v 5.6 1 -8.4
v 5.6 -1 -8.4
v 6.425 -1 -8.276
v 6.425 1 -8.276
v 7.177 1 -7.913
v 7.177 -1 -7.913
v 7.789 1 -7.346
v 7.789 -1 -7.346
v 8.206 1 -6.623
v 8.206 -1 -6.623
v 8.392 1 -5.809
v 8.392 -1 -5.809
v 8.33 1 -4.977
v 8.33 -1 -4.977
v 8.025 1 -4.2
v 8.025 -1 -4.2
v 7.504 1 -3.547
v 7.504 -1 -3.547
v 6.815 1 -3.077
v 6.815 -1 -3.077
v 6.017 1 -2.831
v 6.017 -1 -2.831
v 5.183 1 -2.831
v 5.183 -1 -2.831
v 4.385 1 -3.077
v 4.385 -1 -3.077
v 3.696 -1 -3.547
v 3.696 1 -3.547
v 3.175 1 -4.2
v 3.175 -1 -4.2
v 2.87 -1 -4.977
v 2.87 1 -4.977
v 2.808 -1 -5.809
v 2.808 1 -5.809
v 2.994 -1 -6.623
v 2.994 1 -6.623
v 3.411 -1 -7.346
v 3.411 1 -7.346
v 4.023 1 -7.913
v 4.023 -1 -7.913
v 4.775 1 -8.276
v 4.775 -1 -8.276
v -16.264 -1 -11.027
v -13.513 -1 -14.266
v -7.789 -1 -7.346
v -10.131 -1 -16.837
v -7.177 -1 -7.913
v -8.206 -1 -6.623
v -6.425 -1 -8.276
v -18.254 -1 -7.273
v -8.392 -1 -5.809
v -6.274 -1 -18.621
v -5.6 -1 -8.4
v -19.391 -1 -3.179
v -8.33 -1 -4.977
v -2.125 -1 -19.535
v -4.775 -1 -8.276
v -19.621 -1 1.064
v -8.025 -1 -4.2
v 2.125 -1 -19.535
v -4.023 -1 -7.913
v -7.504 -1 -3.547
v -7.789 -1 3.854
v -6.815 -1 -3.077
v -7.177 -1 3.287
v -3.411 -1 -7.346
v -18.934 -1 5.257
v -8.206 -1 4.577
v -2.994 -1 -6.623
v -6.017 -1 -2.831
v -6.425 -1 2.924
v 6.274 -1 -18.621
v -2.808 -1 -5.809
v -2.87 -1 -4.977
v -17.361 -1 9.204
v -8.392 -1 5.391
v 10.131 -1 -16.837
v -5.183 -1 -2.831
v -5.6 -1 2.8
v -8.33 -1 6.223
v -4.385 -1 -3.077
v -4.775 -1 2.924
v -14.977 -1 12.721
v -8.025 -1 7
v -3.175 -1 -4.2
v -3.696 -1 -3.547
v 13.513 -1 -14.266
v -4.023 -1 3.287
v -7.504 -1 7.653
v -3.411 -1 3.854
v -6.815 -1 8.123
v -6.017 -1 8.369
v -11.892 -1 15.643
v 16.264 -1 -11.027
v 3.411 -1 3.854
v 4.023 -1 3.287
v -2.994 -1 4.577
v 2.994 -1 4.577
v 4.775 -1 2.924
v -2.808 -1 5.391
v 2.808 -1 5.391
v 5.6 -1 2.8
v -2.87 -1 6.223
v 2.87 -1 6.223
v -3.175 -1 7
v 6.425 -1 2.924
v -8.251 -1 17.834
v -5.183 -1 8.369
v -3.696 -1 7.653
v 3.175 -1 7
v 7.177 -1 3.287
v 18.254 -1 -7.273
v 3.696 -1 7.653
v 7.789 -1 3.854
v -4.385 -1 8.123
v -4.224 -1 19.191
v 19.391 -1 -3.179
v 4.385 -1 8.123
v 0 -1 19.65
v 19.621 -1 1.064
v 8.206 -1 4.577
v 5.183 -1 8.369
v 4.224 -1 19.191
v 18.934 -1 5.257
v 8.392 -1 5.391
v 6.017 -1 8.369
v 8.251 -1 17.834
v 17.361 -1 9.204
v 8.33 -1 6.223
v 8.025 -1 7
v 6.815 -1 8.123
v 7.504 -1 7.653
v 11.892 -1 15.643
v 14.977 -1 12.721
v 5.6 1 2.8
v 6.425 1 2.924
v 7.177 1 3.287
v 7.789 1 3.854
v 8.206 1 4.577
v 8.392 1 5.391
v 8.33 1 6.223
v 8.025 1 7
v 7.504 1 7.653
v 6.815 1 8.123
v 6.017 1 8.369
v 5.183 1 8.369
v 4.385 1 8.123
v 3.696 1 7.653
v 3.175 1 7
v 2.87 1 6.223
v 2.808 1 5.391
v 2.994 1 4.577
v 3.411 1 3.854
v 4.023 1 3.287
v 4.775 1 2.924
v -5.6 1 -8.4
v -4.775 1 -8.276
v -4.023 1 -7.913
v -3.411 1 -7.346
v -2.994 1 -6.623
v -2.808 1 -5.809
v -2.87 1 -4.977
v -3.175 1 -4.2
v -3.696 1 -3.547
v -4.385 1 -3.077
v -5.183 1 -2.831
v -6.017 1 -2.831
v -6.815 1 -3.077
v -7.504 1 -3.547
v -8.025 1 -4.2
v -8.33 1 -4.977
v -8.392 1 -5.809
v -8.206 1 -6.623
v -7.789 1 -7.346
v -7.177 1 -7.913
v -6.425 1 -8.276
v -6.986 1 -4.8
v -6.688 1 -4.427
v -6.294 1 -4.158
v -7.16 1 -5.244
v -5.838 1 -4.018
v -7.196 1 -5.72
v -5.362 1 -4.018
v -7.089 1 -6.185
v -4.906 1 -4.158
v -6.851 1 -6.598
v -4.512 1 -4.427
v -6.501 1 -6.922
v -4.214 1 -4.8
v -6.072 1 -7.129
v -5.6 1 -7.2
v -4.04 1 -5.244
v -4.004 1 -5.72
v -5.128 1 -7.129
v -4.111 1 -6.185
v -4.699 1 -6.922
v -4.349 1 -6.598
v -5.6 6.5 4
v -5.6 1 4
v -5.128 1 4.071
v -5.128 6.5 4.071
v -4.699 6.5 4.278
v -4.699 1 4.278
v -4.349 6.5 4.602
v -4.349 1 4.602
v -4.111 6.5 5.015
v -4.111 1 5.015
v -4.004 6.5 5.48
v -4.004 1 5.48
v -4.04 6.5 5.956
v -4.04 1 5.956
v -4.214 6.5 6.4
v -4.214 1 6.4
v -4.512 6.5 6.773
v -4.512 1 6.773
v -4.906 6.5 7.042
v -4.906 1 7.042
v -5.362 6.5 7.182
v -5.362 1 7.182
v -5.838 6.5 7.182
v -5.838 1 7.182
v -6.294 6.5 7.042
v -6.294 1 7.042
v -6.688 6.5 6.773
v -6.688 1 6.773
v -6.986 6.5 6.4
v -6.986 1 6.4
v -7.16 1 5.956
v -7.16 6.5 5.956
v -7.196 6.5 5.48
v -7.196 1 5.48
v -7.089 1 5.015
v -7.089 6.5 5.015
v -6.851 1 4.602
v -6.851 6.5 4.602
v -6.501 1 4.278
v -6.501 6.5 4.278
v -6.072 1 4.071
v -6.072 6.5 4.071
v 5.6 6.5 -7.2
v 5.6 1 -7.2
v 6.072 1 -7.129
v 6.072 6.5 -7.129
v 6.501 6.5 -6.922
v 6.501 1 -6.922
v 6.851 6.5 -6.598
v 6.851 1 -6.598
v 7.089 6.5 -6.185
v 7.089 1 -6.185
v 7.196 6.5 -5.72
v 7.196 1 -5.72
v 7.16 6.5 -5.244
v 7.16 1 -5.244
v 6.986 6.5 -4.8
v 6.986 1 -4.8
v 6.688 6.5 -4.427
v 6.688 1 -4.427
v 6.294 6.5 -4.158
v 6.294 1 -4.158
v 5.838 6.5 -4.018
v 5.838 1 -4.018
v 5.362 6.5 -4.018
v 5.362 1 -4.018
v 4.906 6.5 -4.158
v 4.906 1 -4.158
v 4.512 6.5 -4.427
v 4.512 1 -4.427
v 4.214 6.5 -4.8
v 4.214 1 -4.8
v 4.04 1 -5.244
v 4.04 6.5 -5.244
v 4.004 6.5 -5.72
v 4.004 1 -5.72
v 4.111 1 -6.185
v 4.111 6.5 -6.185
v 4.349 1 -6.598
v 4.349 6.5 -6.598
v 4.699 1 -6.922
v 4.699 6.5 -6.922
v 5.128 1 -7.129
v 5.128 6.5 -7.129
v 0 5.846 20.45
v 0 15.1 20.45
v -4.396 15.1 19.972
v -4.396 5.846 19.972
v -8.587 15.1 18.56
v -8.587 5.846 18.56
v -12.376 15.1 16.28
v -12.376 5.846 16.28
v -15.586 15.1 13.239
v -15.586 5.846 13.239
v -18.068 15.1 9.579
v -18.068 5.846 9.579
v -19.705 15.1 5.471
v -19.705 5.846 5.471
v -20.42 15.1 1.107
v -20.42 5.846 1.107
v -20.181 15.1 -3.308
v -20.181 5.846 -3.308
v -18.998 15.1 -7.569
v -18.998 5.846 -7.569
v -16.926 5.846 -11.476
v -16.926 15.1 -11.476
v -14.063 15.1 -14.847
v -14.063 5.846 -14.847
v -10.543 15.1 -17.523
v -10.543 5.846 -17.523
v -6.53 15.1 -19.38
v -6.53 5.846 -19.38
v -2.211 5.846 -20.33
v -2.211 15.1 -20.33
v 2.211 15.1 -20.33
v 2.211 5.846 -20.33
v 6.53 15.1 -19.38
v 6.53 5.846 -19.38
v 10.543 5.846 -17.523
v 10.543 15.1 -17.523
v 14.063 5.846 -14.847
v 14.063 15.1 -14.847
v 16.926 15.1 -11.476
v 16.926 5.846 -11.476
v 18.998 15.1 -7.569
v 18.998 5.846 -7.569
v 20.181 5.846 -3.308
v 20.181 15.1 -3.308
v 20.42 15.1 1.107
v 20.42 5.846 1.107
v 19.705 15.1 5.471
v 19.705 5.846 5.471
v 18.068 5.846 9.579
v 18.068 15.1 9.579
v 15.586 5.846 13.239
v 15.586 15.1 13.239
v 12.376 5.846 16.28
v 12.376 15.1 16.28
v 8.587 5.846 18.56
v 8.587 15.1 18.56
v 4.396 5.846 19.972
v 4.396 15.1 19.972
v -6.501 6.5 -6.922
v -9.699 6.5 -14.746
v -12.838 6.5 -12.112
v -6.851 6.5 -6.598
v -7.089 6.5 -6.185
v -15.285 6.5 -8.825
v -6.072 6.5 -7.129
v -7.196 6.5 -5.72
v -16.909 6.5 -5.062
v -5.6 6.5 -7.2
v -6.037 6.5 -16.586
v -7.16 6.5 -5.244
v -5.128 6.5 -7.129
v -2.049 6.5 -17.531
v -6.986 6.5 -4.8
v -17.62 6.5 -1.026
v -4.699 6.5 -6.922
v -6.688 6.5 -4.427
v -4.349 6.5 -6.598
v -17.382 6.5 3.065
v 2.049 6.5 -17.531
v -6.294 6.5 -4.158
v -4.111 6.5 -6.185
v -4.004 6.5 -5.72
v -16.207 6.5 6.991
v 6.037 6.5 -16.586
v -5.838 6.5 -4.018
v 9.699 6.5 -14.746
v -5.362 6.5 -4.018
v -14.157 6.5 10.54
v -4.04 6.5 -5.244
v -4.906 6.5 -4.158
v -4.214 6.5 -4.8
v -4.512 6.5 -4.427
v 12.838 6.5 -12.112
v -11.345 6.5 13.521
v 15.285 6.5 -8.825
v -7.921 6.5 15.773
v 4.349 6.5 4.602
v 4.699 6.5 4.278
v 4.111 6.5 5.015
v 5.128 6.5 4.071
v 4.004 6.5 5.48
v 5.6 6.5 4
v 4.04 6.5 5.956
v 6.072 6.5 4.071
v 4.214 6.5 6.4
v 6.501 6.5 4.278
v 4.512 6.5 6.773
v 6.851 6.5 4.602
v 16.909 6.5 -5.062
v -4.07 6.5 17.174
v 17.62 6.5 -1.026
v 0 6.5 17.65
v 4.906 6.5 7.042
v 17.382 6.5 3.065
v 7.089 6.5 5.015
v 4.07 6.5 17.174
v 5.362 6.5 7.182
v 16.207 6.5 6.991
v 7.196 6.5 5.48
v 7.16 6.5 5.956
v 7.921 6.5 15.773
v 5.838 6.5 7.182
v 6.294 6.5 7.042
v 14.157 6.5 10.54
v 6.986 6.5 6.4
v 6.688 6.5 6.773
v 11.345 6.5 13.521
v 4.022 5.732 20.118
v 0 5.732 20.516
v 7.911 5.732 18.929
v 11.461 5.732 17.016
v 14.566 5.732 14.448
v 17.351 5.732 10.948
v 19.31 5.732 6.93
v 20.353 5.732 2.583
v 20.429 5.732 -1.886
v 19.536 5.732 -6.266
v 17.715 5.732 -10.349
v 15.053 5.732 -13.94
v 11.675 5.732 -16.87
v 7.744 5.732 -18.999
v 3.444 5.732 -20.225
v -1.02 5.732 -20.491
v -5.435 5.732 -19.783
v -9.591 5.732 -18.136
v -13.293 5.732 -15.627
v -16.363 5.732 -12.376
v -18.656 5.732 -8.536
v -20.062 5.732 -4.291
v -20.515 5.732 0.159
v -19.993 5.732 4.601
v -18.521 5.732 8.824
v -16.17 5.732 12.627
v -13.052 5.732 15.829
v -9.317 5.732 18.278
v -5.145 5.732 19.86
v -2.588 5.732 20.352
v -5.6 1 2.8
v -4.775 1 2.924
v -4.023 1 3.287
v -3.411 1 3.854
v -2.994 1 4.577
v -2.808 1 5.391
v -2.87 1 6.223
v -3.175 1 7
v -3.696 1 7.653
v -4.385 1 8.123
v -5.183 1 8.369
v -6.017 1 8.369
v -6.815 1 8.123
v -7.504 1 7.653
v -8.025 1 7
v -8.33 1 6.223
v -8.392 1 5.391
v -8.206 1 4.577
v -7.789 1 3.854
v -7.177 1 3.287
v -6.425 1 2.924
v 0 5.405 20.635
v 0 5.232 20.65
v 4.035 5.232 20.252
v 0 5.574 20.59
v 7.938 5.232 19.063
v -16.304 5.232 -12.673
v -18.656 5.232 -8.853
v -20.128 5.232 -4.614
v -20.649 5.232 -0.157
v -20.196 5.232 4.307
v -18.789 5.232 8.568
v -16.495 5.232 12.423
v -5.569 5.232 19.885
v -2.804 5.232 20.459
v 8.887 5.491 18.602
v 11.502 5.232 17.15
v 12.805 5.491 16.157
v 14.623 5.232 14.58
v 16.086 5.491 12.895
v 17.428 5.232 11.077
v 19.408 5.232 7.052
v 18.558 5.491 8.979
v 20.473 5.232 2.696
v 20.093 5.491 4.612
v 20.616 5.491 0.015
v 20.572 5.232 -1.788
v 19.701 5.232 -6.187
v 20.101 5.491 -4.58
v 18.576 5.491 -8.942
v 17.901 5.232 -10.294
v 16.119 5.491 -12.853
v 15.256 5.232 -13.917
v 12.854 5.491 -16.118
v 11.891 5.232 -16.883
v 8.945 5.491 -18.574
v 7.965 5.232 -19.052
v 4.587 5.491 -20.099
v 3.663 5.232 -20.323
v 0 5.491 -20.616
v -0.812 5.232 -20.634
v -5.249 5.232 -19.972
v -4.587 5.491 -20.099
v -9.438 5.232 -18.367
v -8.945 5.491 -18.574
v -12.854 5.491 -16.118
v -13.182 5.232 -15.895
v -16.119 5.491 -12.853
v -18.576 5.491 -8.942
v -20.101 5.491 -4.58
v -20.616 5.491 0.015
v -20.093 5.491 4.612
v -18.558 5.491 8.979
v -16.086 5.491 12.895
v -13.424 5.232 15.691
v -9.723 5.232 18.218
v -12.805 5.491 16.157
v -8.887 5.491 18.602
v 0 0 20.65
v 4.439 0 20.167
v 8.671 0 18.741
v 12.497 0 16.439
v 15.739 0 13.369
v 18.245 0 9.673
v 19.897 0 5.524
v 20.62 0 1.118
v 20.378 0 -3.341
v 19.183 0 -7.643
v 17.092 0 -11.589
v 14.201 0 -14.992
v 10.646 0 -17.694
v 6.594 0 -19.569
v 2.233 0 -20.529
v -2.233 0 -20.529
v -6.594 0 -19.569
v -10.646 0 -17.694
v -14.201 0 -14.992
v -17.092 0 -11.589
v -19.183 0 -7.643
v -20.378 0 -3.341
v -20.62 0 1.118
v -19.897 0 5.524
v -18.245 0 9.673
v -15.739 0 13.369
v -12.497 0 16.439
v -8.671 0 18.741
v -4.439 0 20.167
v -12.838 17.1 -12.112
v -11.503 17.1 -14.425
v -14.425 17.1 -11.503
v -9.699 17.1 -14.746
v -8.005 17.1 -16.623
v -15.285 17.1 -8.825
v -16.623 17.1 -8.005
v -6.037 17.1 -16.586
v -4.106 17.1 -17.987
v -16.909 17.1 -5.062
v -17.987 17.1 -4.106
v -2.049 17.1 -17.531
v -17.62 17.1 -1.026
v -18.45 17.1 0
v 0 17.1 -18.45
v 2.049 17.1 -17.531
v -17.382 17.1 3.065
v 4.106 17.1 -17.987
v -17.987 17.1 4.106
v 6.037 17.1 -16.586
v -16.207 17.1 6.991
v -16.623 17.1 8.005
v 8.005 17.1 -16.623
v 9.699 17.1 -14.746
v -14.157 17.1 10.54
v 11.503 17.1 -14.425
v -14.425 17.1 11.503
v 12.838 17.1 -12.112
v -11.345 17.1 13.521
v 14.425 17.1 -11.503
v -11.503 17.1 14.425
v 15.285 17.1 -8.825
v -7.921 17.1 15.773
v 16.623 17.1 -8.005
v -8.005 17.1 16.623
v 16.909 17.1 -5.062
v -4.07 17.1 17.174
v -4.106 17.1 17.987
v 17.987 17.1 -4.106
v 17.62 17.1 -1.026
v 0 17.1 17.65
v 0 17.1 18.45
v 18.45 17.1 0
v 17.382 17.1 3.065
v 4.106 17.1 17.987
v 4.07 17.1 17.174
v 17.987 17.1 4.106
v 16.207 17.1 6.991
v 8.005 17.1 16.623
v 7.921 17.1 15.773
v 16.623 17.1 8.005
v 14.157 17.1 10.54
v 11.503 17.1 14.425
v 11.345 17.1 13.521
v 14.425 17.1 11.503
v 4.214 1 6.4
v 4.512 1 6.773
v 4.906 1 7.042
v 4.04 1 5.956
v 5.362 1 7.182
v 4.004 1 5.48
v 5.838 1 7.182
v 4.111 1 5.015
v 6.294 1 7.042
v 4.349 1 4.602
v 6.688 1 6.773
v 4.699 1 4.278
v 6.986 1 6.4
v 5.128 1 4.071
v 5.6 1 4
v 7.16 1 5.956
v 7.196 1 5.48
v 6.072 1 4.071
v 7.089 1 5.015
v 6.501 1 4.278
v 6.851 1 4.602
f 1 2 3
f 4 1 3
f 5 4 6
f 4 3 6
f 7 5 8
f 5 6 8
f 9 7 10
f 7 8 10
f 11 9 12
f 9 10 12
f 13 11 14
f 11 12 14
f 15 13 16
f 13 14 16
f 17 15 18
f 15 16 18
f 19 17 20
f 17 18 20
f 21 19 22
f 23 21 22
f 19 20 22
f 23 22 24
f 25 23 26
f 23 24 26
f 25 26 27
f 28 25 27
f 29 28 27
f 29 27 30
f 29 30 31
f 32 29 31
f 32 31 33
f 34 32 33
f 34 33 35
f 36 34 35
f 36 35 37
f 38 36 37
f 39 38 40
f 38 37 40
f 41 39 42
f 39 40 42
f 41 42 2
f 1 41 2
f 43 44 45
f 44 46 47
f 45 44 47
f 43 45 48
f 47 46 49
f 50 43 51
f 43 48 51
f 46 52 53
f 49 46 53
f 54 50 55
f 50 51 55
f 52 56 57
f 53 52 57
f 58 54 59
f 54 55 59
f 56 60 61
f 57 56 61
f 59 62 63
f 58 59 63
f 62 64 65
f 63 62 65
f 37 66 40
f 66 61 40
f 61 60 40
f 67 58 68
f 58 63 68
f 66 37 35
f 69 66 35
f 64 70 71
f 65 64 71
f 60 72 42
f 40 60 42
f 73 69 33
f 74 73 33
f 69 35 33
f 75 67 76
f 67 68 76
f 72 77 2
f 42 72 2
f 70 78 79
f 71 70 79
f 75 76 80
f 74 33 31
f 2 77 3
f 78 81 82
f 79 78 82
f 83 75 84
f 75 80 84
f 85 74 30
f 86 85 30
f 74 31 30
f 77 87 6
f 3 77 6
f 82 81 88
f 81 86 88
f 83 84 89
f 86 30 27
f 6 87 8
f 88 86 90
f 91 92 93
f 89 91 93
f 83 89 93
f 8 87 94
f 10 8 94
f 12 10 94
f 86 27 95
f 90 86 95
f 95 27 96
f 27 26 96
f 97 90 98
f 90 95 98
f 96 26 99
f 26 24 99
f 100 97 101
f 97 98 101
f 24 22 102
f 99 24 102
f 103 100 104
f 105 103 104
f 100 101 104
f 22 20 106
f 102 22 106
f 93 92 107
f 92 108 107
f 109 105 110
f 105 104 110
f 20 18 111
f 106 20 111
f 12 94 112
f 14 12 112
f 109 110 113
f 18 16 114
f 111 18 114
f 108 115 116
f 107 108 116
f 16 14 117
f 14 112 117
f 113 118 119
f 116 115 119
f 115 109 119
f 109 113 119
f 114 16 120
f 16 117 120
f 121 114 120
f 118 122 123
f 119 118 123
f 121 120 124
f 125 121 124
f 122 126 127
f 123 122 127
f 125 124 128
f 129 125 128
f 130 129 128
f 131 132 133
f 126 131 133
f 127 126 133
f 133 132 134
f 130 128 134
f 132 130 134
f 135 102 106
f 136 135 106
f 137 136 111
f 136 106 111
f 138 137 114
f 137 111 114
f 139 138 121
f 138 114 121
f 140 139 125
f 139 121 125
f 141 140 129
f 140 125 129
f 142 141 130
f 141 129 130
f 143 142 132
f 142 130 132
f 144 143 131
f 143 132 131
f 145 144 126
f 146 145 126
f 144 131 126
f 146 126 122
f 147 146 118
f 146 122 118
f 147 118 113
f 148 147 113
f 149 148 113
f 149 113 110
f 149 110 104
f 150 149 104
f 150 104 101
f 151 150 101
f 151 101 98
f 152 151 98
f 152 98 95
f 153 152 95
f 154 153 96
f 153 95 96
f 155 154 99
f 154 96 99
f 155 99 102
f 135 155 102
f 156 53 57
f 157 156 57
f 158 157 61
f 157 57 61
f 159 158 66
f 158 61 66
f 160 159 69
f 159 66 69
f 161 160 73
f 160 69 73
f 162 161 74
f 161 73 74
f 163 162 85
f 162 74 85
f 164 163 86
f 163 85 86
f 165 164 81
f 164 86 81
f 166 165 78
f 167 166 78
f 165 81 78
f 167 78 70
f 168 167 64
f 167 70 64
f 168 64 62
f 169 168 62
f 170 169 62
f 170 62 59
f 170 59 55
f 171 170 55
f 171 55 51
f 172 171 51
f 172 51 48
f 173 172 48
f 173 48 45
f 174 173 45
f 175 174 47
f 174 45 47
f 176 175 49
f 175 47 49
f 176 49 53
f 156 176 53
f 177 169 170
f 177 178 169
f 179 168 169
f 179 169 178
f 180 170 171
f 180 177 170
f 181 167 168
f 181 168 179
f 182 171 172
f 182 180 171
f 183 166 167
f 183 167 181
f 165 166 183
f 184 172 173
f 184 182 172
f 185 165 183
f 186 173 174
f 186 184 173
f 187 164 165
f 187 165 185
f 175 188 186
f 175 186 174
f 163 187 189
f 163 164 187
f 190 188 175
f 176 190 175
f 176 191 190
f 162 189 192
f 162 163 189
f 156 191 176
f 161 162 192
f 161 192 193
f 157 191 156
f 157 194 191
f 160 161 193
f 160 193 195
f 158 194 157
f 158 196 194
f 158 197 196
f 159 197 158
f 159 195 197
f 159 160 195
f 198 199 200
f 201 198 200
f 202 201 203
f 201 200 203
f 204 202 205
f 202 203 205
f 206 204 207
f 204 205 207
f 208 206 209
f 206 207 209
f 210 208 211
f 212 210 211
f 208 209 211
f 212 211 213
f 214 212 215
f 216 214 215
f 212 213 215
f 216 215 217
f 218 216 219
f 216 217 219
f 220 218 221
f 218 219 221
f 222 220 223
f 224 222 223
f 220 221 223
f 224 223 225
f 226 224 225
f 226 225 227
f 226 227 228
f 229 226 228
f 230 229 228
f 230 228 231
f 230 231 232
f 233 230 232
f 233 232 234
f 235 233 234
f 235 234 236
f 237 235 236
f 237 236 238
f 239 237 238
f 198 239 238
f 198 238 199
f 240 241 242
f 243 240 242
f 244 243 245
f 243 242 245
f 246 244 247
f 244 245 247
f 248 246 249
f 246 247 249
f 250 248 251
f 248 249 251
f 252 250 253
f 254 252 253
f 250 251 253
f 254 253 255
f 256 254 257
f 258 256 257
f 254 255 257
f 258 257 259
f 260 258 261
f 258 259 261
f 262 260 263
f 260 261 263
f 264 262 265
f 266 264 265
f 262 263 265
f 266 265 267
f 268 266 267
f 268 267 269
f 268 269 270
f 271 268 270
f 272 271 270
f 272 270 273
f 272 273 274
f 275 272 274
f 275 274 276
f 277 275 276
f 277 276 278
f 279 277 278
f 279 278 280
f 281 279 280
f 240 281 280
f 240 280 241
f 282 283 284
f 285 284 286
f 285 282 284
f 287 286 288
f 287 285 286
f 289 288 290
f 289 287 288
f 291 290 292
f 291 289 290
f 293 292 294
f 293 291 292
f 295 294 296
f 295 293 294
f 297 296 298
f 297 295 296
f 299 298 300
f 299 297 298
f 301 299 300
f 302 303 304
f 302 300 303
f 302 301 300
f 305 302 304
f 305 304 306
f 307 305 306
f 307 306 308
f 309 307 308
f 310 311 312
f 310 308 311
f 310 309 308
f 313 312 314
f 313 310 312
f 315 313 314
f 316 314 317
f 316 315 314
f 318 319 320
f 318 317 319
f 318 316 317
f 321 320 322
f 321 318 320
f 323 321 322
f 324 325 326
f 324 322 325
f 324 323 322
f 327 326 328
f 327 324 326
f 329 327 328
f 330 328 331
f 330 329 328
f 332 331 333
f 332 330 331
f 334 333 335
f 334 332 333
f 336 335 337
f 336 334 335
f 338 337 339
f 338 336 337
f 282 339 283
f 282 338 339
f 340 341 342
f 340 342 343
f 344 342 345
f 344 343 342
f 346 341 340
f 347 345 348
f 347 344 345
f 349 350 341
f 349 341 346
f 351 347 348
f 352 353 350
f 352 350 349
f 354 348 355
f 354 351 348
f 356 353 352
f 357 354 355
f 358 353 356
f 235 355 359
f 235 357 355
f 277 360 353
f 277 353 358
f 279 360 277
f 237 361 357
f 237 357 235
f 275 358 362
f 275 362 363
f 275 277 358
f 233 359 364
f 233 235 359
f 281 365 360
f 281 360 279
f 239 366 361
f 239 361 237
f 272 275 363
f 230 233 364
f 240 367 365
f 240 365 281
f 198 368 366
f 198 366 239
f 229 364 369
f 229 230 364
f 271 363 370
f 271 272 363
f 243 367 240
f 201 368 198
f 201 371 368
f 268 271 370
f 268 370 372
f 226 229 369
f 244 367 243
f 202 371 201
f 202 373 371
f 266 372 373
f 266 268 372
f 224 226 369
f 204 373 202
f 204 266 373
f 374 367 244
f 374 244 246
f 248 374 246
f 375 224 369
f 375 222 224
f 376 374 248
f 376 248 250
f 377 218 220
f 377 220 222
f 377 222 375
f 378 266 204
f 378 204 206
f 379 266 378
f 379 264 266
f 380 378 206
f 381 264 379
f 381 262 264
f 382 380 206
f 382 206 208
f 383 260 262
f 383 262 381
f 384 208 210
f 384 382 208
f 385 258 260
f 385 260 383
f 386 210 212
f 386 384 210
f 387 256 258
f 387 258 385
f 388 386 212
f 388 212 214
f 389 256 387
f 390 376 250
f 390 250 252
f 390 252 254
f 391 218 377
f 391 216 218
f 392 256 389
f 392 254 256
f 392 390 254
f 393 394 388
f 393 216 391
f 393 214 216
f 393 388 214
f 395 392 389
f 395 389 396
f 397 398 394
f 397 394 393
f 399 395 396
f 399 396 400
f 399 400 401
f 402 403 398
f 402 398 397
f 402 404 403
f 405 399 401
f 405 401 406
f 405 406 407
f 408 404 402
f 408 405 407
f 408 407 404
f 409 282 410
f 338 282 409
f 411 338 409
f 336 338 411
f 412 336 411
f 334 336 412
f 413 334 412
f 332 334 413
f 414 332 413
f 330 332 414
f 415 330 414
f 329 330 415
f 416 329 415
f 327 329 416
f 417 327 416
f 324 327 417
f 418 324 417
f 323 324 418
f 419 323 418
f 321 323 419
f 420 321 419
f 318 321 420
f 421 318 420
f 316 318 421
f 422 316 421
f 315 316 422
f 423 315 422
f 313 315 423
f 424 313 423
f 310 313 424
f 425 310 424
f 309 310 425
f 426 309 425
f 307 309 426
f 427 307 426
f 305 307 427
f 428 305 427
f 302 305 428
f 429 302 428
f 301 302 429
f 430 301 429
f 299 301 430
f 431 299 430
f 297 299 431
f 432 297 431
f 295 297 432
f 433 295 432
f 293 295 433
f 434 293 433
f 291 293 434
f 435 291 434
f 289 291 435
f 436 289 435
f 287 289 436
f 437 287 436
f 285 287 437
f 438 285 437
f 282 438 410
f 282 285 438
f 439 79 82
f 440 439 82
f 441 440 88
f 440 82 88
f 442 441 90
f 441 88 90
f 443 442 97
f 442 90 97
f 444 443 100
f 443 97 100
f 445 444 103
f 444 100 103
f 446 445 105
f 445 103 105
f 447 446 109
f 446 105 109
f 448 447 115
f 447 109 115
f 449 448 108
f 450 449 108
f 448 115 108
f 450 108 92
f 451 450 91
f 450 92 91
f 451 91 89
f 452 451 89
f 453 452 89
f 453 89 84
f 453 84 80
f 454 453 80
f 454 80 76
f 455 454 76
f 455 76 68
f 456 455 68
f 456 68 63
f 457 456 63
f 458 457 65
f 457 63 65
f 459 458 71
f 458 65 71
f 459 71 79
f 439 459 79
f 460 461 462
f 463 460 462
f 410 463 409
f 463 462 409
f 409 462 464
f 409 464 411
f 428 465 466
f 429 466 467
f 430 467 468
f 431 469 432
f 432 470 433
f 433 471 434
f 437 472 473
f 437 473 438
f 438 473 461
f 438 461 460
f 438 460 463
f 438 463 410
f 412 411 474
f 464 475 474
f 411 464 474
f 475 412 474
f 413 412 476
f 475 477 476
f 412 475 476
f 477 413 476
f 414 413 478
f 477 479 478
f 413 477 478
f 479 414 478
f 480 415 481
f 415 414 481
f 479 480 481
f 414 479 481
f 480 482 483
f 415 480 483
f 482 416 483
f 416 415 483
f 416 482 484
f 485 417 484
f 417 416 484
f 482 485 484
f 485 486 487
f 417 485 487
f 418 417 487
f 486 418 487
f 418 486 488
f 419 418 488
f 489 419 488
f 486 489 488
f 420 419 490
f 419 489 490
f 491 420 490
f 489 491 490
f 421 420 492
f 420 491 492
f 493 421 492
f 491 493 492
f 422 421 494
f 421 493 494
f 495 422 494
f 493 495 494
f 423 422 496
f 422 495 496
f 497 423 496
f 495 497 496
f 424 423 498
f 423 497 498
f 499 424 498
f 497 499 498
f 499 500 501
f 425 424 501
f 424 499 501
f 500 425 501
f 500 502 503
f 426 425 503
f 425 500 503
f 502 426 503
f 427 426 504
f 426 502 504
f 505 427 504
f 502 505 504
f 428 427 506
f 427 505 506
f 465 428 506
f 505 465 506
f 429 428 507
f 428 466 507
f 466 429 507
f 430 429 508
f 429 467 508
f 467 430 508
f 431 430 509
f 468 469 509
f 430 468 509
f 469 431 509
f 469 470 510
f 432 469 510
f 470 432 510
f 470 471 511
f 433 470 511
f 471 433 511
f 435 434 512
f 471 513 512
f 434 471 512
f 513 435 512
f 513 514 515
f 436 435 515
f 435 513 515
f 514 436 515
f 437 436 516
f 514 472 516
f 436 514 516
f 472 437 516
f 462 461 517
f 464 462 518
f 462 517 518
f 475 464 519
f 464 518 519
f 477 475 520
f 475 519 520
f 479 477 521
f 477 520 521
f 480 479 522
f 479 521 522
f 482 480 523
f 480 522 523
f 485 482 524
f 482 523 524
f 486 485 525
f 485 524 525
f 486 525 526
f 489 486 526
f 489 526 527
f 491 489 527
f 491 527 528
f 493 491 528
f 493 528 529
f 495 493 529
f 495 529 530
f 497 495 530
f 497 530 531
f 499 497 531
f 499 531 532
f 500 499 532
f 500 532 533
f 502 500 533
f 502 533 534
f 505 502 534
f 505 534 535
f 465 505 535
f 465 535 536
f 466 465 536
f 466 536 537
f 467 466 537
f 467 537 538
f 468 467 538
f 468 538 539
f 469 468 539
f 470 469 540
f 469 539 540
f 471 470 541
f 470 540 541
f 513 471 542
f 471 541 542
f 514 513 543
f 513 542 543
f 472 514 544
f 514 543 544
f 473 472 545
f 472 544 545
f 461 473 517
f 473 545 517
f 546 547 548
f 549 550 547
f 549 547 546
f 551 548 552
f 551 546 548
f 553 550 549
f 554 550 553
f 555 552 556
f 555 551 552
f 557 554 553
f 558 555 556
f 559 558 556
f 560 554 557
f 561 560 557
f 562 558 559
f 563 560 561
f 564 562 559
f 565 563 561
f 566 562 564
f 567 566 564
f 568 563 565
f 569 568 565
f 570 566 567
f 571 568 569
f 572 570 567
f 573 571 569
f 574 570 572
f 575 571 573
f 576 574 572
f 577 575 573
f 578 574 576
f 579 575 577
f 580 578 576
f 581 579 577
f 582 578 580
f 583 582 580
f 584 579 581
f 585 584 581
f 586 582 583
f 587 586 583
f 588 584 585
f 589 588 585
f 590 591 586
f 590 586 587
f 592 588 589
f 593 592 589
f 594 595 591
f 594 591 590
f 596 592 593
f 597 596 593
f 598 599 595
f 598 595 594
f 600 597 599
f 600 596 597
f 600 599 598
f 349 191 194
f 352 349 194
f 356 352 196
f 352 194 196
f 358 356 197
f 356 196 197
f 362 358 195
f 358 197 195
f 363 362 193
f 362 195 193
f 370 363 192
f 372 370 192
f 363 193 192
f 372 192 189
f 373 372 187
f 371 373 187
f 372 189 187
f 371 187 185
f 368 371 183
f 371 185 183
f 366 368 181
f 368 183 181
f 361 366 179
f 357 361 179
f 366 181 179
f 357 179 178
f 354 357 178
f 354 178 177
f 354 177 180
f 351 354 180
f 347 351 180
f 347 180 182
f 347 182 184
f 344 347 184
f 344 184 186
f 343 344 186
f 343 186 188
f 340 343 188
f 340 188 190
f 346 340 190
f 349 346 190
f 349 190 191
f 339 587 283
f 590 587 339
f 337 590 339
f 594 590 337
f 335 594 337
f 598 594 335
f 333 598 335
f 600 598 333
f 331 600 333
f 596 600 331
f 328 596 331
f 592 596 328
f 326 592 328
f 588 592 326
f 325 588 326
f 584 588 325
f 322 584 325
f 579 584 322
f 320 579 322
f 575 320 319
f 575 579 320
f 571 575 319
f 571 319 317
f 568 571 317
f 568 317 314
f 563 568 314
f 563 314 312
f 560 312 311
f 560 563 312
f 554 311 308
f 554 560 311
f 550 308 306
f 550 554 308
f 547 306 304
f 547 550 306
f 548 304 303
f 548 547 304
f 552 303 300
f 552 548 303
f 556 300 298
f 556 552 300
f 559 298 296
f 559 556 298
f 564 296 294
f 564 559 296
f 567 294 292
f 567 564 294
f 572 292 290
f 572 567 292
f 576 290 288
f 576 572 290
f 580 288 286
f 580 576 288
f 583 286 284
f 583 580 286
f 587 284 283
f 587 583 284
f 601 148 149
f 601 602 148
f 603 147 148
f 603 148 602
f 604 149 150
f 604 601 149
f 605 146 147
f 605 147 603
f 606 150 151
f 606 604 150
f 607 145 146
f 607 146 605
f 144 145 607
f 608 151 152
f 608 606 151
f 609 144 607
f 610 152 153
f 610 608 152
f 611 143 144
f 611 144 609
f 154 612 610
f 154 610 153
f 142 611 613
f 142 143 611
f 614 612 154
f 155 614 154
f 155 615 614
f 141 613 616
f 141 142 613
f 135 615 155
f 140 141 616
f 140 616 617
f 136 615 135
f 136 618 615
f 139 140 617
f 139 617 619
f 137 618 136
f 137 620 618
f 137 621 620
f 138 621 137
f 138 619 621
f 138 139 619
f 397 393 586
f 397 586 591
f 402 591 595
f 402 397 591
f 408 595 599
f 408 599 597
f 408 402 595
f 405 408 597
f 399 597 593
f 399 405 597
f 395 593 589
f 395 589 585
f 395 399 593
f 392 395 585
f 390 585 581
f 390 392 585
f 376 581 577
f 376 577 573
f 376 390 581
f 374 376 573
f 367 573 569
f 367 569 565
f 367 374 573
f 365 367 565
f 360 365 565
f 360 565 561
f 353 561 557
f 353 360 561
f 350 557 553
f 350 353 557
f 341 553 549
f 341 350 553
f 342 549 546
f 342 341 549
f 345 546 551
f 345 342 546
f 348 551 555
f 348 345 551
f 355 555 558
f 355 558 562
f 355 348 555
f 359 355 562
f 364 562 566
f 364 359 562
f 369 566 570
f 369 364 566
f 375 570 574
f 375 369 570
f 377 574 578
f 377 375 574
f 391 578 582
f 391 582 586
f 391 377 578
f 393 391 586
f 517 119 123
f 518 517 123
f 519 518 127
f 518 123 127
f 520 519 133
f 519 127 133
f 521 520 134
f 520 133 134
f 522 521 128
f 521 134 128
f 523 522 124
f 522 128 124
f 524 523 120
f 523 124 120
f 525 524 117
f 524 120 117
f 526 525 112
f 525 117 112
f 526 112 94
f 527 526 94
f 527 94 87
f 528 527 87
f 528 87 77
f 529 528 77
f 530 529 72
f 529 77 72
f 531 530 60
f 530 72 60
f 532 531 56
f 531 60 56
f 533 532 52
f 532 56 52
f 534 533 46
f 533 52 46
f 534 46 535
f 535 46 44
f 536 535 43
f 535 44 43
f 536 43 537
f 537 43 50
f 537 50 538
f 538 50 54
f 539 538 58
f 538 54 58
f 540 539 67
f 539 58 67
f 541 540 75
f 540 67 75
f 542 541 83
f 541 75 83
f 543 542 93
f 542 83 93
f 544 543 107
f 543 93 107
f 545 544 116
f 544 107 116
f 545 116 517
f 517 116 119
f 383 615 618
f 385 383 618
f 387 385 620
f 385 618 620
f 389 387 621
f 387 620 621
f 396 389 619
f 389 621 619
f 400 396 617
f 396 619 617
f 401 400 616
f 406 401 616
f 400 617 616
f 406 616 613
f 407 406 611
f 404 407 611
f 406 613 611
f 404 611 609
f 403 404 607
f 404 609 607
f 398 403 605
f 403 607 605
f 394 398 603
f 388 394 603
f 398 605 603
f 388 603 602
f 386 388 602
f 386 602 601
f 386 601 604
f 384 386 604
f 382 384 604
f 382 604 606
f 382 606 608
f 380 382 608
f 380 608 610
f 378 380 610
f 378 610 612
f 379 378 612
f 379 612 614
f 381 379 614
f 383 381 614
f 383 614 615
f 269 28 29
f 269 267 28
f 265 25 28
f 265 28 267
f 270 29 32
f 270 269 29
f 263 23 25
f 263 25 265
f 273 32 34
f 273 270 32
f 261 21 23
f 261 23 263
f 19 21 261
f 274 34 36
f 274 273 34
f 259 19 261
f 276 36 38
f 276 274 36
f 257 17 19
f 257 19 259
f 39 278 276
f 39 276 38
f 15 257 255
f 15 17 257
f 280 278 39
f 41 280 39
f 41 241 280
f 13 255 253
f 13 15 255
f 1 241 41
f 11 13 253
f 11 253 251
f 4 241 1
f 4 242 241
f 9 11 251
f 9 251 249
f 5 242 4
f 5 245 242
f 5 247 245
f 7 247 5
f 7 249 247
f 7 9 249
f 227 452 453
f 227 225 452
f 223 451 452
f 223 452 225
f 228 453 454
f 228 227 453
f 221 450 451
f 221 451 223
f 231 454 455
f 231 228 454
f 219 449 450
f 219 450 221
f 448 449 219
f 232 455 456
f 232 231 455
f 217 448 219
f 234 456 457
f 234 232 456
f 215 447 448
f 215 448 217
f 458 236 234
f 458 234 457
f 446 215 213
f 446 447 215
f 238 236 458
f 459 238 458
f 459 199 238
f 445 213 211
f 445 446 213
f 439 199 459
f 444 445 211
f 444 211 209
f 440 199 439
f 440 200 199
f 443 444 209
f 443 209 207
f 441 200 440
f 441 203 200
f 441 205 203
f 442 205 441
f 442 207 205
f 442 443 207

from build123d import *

# Parameters (mm, degrees)
BOSS_EXTRUDE1_DEPTH      = 6.5
BOSS_EXTRUDE1_DEPTH_BACK = 1
SKETCH1_R                = 20.65
SKETCH2_R                = 20.45
SKETCH2_R_2              = 17.65
BOSS_EXTRUDE2_DEPTH      = 10.6
SKETCH4_R                = 1.6
CUT_EXTRUDE1_DEPTH       = 13.5
SKETCH8_R                = 2.8
CUT_EXTRUDE2_DEPTH       = 2
CHAMFER1_SIZE            = 1
CHAMFER3_SIZE            = 1
CHAMFER3_SIZE_2          = 0.577350269
FILLET1_R                = 1
CHAMFER4_SIZE            = 2


# Some blends are built 0.0001 mm under size
with BuildPart() as part:
    # Sketch1 → Boss-Extrude1 (new, two sides: drawn at the far end of the back side and taken through both)
    with BuildSketch(Plane(origin=(0, 0, 0), x_dir=(1, 0, 0), z_dir=(0, 1, 0)).offset(-BOSS_EXTRUDE1_DEPTH_BACK)):
        with Locations(Location((0, 0, 0), (0, 0, 270))):
            Circle(SKETCH1_R)
    extrude(amount=BOSS_EXTRUDE1_DEPTH + BOSS_EXTRUDE1_DEPTH_BACK)

    # Sketch2 → Boss-Extrude2 (add)
    with BuildSketch(Plane(origin=(0, 6.5, 0), x_dir=(1, 0, 0), z_dir=(0, 1, 0))):
        with Locations(Location((0, 0, 0), (0, 0, 270))):
            Circle(SKETCH2_R)
        with Locations(Location((0, 0, 0), (0, 0, 270))):
            Circle(SKETCH2_R_2, mode=Mode.SUBTRACT)
    extrude(amount=BOSS_EXTRUDE2_DEPTH)

    # Sketch4 → Cut-Extrude1 (cut)
    with BuildSketch(Plane.XZ.offset(1)):
        with Locations(Location((-5.6, 5.6, 0), (0, 0, 270))):
            Circle(SKETCH4_R)
        with Locations(Location((5.6, 5.6, 0), (0, 0, 270))):
            Circle(SKETCH4_R)
        with Locations(Location((5.6, -5.6, 0), (0, 0, 270))):
            Circle(SKETCH4_R)
        with Locations(Location((-5.6, -5.6, 0), (0, 0, 270))):
            Circle(SKETCH4_R)
    extrude(amount=-CUT_EXTRUDE1_DEPTH, mode=Mode.SUBTRACT)

    # Sketch8 → Cut-Extrude2 (cut)
    with BuildSketch(Plane.XZ.offset(1)):
        with Locations(Location((5.6, -5.6, 0), (0, 0, 270))):
            Circle(SKETCH8_R)
        with Locations(Location((-5.6, -5.6, 0), (0, 0, 270))):
            Circle(SKETCH8_R)
        with Locations(Location((-5.6, 5.6, 0), (0, 0, 270))):
            Circle(SKETCH8_R)
        with Locations(Location((5.6, 5.6, 0), (0, 0, 270))):
            Circle(SKETCH8_R)
    extrude(amount=-CUT_EXTRUDE2_DEPTH, mode=Mode.SUBTRACT)

    # Chamfer1
    chamfer1_edges = [part.edges().sort_by_distance(p)[0] for p in [
        (0, -1, -20.65),
    ]]
    chamfer(chamfer1_edges, length=CHAMFER1_SIZE - 0.0001)  # a hair under: the kernel refuses the full size

    # Chamfer3
    # the kernel refuses this chamfer: 1, 0.577350269 mm, written as the material it takes off along each edge
    with BuildSketch(Plane(origin=(0, 6.5, 0), x_dir=(0, 0, 1), z_dir=(-1, 0, 0))) as chamfer3_piece_1_section:
        Polygon((20.65, -CHAMFER3_SIZE), (20.65 - CHAMFER3_SIZE_2, 0), (20.65, 0), align=None)
    chamfer3_piece_1 = revolve(axis=Axis((0, 6.5, 0), (0, 1, 0)), mode=Mode.PRIVATE)
    chamfer3_piece_1 = chamfer3_piece_1 - Plane(origin=(0, 5.670486655, 0), x_dir=(0, 0, 1), z_dir=(0, -1, 0)) * Cylinder(20.45, 83, mode=Mode.PRIVATE)
    add(chamfer3_piece_1, mode=Mode.SUBTRACT)

    # Fillet1
    fillet1_edges = [part.edges().sort_by_distance(p)[0] for p in [
        (0, 5.5, -20.65),
    ]]
    fillet(fillet1_edges, radius=FILLET1_R)

    # Chamfer4
    chamfer4_edges = [part.edges().sort_by_distance(p)[0] for p in [
        (0, 17.1, -20.45),
    ]]
    chamfer(chamfer4_edges, length=CHAMFER4_SIZE)


solid = part.part
